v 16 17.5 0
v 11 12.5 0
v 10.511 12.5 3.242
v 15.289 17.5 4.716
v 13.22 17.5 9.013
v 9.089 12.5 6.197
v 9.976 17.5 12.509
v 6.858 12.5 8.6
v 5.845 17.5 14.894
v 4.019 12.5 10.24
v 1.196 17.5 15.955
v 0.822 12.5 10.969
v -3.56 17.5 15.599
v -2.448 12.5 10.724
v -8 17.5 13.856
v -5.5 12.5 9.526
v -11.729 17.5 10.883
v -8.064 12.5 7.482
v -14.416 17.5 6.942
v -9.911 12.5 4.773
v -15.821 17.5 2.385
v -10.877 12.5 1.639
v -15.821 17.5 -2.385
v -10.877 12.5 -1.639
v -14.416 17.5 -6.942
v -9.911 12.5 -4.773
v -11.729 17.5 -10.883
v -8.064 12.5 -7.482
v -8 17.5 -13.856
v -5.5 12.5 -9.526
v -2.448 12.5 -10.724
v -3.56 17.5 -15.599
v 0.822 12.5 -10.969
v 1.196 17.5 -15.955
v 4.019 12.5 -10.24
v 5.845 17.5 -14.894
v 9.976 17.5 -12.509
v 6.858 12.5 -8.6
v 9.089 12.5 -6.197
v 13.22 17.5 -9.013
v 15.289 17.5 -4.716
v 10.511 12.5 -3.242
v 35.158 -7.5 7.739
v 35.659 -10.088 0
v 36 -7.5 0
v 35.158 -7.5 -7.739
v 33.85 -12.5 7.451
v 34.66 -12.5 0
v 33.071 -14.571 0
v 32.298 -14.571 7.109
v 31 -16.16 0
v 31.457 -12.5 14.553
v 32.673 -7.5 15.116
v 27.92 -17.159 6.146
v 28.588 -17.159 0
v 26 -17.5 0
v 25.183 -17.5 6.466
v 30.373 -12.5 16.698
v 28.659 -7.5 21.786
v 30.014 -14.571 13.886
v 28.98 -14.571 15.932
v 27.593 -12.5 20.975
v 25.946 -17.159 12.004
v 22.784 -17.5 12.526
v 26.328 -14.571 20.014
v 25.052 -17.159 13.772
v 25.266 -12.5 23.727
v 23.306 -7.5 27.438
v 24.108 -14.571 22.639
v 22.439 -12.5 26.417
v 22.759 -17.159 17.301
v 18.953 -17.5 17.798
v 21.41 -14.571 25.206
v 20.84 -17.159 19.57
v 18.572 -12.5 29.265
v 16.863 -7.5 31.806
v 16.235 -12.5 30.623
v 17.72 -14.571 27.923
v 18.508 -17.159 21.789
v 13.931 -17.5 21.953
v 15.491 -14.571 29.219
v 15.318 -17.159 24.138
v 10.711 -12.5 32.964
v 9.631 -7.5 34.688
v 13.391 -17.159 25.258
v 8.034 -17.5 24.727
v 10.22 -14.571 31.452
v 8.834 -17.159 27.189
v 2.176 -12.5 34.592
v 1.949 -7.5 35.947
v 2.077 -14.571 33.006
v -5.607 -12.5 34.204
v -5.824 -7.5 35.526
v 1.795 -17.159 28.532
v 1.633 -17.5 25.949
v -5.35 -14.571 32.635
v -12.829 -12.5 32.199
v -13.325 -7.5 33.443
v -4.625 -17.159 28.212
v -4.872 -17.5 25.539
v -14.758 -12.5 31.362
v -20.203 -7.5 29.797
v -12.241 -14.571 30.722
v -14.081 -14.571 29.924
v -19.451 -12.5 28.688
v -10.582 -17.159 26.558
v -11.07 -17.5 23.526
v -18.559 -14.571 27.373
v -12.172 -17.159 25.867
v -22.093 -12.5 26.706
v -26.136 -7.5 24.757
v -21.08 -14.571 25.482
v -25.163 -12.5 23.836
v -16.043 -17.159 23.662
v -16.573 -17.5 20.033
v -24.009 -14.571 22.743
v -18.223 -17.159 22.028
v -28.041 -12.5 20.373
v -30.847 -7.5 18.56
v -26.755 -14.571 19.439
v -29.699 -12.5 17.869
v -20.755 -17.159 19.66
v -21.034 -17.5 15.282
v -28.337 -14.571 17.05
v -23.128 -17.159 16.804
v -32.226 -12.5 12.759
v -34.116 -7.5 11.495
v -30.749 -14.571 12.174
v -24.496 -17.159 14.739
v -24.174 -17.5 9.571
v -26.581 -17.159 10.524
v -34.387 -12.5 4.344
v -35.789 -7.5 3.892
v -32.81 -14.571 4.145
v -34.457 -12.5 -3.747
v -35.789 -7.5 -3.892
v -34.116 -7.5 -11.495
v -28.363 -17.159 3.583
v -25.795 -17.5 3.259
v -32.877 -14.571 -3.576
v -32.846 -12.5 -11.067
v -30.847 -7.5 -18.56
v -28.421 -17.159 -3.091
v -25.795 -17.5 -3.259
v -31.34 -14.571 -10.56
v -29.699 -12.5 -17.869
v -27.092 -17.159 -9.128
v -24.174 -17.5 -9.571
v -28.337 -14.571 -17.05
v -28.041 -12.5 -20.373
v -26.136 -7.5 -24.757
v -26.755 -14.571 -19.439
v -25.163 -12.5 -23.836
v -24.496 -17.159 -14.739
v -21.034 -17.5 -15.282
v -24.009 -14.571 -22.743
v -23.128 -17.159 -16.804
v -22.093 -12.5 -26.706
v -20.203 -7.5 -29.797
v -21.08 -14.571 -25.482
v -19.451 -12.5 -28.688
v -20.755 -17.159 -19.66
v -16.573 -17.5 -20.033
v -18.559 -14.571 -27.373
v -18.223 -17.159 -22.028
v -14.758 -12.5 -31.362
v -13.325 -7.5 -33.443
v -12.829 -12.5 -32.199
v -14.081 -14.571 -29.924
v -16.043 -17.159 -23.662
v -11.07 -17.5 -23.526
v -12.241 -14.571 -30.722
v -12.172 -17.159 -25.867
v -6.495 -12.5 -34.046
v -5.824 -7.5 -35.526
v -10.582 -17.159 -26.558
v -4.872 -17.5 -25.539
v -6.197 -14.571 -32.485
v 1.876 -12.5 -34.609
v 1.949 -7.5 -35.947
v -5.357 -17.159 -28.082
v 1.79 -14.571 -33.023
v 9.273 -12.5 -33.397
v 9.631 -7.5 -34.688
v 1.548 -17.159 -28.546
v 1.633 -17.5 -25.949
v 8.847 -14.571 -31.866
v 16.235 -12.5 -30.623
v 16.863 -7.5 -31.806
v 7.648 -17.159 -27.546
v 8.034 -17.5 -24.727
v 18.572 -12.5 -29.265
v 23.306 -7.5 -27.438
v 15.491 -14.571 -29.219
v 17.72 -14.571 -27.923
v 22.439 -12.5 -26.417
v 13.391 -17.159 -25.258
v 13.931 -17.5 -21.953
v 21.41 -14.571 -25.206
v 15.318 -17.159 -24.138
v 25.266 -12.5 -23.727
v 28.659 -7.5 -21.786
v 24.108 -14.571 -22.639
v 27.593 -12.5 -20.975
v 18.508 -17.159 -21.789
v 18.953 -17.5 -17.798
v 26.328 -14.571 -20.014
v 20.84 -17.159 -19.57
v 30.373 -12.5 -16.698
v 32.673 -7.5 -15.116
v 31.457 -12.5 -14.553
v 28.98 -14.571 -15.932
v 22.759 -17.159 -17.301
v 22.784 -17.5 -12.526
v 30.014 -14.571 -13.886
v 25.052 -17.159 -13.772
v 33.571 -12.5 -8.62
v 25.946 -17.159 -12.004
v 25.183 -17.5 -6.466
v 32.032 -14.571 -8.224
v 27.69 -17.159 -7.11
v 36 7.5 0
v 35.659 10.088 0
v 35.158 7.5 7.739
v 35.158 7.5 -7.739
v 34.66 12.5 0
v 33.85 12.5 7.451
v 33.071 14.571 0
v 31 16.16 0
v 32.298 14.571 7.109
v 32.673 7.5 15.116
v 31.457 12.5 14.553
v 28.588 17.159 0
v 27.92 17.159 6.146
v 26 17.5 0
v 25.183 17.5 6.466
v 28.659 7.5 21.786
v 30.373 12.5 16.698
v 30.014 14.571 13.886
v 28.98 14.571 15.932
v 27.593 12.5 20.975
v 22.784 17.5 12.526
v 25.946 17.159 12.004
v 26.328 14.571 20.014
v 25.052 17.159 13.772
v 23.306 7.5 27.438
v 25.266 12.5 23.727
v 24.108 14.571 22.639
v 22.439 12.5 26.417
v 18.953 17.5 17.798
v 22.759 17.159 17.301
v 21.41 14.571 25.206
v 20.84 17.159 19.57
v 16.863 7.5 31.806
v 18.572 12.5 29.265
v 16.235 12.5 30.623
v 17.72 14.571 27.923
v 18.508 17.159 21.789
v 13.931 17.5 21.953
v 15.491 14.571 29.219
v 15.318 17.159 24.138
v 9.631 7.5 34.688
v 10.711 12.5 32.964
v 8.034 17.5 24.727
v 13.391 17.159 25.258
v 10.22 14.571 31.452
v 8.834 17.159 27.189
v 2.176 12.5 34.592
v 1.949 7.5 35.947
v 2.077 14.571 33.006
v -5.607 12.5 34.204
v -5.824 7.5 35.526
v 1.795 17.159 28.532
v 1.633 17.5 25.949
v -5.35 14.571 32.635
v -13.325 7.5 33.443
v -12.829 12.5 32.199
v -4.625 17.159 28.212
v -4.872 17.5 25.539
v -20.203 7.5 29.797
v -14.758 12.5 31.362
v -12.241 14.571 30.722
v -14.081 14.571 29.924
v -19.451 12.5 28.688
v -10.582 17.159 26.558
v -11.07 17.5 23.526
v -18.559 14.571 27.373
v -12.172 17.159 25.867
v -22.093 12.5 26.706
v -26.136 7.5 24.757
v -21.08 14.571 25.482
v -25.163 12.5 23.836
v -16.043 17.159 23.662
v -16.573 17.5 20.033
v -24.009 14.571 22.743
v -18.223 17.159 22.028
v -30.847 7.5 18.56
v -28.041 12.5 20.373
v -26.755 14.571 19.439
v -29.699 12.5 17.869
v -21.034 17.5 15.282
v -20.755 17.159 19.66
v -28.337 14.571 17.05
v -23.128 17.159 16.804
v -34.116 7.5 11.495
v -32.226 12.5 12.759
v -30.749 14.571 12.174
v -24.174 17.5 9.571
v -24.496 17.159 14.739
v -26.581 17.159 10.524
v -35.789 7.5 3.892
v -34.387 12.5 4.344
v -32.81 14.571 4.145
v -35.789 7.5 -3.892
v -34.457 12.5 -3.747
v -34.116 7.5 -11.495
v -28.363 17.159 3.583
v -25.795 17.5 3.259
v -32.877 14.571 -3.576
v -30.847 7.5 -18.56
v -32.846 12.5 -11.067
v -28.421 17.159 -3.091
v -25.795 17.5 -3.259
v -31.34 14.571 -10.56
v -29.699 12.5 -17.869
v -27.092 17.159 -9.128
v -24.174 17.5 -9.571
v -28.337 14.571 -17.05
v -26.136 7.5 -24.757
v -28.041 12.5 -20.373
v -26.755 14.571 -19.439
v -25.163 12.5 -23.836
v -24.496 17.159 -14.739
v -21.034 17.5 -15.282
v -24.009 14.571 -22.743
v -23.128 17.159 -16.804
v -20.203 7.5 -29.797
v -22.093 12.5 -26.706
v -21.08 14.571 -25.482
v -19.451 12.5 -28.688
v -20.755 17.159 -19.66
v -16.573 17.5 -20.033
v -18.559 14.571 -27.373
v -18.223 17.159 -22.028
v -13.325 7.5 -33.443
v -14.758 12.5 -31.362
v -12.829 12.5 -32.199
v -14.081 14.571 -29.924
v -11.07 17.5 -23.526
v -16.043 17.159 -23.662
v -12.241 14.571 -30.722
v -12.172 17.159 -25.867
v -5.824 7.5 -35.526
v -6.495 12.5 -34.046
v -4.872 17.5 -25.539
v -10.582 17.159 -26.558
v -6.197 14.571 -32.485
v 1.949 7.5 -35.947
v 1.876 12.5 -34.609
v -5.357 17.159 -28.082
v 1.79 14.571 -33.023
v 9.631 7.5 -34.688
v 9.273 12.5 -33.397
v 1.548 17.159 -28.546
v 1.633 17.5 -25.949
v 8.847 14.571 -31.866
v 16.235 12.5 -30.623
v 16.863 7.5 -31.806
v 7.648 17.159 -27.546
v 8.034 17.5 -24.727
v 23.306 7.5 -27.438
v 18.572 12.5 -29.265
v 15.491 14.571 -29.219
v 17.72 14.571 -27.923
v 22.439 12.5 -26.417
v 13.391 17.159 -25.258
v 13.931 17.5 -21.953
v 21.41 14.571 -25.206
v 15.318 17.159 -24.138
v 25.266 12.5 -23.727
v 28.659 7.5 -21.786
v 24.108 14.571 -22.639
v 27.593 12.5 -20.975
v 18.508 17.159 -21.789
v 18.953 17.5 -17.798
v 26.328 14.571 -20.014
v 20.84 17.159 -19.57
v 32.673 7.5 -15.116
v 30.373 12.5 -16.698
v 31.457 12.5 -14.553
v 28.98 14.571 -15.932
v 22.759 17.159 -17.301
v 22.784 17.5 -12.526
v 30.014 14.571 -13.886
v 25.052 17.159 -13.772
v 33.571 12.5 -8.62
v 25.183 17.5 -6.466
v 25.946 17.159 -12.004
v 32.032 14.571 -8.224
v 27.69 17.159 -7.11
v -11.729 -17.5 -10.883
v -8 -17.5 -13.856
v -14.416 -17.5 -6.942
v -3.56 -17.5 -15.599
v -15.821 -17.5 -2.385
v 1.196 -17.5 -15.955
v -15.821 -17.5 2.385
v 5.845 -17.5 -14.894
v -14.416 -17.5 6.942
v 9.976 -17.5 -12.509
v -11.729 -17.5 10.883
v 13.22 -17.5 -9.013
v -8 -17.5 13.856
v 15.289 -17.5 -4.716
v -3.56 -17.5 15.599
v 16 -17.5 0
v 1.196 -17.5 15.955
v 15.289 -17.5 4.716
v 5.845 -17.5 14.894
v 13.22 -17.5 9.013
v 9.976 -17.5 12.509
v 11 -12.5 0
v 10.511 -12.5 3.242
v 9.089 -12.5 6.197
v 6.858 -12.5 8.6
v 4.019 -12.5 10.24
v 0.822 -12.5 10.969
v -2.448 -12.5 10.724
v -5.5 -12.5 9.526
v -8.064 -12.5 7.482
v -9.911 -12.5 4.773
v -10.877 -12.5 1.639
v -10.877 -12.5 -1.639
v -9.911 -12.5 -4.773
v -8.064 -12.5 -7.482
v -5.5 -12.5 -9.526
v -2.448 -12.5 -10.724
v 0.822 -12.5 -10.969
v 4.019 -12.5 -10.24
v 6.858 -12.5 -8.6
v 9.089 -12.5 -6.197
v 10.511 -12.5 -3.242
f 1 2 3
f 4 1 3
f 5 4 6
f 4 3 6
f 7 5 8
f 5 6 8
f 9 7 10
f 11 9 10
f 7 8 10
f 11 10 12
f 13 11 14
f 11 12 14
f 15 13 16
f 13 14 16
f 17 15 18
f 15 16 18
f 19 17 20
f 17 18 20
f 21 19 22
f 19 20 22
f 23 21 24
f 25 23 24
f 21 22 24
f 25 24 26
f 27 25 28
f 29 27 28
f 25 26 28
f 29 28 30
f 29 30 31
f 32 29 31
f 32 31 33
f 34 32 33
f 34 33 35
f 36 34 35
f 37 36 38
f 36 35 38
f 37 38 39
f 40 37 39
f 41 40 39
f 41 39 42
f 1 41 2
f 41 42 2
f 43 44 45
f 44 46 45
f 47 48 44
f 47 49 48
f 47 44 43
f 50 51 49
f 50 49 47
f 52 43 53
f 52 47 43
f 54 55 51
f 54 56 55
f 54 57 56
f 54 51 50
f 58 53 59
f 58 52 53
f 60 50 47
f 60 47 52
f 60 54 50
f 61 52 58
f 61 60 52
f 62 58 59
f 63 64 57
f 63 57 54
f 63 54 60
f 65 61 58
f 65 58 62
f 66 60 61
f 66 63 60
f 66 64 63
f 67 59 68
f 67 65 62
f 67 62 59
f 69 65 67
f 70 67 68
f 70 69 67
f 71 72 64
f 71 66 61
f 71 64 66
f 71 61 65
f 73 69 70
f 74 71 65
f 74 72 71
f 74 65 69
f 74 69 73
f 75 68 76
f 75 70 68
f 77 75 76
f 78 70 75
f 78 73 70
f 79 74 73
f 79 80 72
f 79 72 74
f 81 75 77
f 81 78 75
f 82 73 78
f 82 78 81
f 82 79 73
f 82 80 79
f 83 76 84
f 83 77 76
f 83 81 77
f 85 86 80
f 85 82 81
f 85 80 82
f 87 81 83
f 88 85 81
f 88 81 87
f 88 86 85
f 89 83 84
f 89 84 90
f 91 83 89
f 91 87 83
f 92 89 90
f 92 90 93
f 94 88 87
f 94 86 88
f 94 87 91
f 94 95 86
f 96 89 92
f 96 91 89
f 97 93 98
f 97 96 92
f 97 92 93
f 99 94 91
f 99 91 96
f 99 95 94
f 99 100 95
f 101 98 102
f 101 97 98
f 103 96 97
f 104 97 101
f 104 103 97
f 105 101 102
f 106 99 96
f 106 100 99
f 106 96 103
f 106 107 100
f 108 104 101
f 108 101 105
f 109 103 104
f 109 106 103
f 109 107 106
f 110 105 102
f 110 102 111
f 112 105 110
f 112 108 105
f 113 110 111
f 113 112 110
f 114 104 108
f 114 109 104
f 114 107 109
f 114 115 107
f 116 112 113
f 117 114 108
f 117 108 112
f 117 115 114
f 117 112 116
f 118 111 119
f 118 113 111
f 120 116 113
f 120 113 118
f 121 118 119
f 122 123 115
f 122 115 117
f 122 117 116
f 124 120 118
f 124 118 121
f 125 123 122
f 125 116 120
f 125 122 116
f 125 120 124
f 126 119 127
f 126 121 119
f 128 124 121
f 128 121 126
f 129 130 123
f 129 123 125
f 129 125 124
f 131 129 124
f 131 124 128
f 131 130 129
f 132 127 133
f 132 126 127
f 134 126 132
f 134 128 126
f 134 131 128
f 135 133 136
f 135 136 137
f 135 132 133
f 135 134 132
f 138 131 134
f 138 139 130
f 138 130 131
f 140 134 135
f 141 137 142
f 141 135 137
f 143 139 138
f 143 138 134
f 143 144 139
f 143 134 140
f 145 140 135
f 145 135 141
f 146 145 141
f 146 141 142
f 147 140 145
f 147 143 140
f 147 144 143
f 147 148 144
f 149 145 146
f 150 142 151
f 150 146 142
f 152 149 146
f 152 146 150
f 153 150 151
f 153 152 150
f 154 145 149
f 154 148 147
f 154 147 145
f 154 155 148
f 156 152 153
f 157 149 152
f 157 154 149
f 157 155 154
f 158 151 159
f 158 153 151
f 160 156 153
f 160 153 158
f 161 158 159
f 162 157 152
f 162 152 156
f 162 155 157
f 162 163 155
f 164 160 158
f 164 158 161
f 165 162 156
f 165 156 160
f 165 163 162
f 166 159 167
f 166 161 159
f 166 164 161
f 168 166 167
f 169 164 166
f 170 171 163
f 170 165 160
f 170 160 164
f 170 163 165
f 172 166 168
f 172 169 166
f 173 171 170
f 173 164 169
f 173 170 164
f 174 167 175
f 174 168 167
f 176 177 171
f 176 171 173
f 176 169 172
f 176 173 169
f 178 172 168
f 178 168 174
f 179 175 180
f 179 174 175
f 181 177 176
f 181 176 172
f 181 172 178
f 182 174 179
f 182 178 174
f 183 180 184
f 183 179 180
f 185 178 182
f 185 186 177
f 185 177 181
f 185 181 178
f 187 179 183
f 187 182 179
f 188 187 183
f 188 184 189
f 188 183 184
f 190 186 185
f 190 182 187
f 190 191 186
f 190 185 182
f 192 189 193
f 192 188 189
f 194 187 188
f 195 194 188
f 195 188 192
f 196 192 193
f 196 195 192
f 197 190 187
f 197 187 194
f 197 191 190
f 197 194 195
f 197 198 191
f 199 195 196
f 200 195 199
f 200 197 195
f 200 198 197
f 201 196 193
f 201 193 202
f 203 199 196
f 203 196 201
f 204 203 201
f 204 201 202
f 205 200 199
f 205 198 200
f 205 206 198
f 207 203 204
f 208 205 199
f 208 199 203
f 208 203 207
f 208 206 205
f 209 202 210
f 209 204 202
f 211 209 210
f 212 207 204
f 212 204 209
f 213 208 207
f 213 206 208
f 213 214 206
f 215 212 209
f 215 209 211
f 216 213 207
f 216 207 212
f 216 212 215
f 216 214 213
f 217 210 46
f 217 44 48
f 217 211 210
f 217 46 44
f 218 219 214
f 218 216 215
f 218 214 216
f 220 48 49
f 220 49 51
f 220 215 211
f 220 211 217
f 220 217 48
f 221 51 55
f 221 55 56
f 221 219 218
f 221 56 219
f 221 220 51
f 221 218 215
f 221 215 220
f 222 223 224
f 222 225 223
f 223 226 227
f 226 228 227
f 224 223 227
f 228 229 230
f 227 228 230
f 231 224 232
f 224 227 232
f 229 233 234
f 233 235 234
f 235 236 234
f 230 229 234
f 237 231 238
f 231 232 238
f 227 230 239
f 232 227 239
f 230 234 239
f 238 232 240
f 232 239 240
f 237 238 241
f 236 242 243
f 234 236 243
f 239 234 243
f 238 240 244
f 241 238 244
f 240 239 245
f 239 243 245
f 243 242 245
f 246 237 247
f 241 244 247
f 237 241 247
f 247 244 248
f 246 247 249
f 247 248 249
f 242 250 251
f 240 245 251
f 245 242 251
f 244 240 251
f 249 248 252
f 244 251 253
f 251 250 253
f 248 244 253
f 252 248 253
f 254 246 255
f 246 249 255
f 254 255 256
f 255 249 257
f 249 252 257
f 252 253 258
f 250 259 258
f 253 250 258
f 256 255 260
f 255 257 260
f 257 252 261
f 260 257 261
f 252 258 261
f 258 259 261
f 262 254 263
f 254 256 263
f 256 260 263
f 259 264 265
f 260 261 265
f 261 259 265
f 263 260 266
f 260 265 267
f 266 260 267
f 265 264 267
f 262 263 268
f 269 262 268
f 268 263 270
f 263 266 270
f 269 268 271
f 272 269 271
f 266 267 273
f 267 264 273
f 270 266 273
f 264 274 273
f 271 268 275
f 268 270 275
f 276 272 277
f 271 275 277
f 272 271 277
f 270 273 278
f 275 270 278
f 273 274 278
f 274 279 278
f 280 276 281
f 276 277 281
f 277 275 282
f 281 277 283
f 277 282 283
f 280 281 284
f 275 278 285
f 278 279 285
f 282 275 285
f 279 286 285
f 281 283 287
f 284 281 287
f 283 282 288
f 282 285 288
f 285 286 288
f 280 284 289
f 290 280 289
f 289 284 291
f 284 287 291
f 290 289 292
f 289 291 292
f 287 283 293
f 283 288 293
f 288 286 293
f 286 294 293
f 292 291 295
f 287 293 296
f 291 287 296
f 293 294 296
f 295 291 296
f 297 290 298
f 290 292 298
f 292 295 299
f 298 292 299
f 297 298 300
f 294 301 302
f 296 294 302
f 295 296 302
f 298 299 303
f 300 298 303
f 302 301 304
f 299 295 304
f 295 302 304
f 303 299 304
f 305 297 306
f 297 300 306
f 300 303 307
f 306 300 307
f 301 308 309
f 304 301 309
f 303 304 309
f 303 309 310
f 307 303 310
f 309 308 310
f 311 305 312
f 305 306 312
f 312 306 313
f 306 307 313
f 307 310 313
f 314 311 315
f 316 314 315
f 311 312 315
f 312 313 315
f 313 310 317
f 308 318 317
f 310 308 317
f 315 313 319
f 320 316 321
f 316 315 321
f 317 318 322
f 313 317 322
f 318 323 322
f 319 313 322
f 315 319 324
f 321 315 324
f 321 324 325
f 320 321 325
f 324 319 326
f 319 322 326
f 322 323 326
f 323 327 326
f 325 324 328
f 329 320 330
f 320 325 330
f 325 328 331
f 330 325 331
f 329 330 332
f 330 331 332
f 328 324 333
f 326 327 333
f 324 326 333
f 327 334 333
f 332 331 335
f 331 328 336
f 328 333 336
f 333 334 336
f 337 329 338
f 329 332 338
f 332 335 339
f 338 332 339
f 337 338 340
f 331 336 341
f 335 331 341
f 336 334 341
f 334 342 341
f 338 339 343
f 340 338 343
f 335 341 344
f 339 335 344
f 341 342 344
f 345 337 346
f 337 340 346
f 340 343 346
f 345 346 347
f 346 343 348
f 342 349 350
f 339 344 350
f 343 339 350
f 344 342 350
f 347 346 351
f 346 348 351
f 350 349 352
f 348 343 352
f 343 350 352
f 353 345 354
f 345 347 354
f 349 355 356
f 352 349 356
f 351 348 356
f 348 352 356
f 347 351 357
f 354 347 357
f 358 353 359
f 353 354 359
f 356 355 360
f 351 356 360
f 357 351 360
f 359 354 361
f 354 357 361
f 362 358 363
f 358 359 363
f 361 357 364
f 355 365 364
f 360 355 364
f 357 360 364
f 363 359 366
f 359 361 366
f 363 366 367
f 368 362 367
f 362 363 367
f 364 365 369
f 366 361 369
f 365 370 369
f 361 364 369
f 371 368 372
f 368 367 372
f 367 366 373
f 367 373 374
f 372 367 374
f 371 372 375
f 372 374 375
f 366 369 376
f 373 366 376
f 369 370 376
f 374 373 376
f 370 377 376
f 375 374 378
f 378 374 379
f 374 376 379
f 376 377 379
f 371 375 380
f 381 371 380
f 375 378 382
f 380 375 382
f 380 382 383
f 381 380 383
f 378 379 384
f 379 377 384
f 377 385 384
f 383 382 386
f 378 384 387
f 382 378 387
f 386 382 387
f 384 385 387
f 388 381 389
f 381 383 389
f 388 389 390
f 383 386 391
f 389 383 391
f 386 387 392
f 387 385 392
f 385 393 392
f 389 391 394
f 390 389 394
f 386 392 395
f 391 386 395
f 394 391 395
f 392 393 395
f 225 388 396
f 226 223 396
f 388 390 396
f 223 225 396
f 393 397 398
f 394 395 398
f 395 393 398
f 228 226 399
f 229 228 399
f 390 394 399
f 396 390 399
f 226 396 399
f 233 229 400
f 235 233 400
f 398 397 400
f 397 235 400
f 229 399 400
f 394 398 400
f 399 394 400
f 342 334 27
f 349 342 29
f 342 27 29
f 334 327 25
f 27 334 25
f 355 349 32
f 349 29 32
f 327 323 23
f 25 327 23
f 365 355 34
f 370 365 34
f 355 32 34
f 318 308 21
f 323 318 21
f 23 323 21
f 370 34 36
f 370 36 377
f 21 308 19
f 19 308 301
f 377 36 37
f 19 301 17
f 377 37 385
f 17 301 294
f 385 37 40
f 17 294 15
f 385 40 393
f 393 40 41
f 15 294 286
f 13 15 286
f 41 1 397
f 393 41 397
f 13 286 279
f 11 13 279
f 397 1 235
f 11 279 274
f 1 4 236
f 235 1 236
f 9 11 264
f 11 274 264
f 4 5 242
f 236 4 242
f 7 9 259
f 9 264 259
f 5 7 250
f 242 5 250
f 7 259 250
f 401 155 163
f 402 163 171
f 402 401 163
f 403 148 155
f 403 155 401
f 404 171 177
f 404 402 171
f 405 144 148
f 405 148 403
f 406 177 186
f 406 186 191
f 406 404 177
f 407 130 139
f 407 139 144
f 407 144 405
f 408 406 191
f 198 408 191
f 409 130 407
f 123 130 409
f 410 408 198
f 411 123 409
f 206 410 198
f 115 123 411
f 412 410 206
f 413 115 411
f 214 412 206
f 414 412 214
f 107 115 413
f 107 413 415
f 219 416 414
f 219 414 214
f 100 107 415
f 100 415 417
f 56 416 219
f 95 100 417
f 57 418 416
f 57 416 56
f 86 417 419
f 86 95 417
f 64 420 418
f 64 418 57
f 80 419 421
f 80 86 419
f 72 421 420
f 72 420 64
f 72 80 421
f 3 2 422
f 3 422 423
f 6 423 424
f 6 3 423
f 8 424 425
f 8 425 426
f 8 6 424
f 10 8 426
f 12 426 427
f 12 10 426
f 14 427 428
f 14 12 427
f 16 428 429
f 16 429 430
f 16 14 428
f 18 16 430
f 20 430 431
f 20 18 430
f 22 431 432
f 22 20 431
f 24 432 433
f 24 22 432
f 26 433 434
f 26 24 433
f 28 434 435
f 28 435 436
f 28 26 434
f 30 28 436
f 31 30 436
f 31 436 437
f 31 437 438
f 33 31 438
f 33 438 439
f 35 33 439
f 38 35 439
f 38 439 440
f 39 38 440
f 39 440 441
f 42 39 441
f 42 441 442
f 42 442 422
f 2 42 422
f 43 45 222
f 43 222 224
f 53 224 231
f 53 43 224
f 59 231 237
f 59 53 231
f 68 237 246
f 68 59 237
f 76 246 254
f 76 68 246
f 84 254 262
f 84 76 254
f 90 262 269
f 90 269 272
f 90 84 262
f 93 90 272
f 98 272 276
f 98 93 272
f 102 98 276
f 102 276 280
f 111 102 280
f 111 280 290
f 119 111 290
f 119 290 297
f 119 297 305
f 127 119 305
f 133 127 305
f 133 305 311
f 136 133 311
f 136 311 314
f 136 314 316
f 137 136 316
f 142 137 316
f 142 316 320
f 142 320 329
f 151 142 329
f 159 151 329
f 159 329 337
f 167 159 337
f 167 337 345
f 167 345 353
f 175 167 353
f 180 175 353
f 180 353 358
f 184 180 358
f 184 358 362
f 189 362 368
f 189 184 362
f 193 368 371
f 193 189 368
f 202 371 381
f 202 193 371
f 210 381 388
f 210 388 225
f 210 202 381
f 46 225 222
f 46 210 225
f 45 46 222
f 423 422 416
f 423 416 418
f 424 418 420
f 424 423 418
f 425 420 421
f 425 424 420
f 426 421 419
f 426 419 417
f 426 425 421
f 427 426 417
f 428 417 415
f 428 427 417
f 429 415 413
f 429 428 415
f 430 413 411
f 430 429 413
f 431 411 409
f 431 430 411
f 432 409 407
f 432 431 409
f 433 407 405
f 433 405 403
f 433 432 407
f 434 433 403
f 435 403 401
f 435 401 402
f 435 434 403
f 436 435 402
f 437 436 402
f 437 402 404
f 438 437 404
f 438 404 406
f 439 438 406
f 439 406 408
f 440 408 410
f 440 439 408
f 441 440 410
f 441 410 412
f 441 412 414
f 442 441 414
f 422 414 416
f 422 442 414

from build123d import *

# Parameters (mm, degrees)
F0_R     = 36
F0_R_2   = 11
F1_DEPTH = 17.5
F2_R     = 10
F3_SIZE  = 5


with BuildPart() as f1:
    # F0 (on Front) → F1 (new body, symmetric)
    with BuildSketch(Plane.XZ):
        Circle(F0_R)
        Circle(F0_R_2, mode=Mode.SUBTRACT)
    extrude(amount=F1_DEPTH, both=True)

    # F2
    f2_edges = [f1.edges().sort_by_distance(p)[0] for p in [
        (-36, -17.5, 0),
        (-36, 17.5, 0),
    ]]
    fillet(f2_edges, radius=F2_R)

    # F3
    f3_edges = [f1.edges().sort_by_distance(p)[0] for p in [
        (36, 0, 0),
        (-36, 7.5, 0),
        (-36, -7.5, 0),
        (-11, -17.5, 0),
        (-11, 17.5, 0),
    ]]
    chamfer(f3_edges, length=F3_SIZE)


solid = f1.part
